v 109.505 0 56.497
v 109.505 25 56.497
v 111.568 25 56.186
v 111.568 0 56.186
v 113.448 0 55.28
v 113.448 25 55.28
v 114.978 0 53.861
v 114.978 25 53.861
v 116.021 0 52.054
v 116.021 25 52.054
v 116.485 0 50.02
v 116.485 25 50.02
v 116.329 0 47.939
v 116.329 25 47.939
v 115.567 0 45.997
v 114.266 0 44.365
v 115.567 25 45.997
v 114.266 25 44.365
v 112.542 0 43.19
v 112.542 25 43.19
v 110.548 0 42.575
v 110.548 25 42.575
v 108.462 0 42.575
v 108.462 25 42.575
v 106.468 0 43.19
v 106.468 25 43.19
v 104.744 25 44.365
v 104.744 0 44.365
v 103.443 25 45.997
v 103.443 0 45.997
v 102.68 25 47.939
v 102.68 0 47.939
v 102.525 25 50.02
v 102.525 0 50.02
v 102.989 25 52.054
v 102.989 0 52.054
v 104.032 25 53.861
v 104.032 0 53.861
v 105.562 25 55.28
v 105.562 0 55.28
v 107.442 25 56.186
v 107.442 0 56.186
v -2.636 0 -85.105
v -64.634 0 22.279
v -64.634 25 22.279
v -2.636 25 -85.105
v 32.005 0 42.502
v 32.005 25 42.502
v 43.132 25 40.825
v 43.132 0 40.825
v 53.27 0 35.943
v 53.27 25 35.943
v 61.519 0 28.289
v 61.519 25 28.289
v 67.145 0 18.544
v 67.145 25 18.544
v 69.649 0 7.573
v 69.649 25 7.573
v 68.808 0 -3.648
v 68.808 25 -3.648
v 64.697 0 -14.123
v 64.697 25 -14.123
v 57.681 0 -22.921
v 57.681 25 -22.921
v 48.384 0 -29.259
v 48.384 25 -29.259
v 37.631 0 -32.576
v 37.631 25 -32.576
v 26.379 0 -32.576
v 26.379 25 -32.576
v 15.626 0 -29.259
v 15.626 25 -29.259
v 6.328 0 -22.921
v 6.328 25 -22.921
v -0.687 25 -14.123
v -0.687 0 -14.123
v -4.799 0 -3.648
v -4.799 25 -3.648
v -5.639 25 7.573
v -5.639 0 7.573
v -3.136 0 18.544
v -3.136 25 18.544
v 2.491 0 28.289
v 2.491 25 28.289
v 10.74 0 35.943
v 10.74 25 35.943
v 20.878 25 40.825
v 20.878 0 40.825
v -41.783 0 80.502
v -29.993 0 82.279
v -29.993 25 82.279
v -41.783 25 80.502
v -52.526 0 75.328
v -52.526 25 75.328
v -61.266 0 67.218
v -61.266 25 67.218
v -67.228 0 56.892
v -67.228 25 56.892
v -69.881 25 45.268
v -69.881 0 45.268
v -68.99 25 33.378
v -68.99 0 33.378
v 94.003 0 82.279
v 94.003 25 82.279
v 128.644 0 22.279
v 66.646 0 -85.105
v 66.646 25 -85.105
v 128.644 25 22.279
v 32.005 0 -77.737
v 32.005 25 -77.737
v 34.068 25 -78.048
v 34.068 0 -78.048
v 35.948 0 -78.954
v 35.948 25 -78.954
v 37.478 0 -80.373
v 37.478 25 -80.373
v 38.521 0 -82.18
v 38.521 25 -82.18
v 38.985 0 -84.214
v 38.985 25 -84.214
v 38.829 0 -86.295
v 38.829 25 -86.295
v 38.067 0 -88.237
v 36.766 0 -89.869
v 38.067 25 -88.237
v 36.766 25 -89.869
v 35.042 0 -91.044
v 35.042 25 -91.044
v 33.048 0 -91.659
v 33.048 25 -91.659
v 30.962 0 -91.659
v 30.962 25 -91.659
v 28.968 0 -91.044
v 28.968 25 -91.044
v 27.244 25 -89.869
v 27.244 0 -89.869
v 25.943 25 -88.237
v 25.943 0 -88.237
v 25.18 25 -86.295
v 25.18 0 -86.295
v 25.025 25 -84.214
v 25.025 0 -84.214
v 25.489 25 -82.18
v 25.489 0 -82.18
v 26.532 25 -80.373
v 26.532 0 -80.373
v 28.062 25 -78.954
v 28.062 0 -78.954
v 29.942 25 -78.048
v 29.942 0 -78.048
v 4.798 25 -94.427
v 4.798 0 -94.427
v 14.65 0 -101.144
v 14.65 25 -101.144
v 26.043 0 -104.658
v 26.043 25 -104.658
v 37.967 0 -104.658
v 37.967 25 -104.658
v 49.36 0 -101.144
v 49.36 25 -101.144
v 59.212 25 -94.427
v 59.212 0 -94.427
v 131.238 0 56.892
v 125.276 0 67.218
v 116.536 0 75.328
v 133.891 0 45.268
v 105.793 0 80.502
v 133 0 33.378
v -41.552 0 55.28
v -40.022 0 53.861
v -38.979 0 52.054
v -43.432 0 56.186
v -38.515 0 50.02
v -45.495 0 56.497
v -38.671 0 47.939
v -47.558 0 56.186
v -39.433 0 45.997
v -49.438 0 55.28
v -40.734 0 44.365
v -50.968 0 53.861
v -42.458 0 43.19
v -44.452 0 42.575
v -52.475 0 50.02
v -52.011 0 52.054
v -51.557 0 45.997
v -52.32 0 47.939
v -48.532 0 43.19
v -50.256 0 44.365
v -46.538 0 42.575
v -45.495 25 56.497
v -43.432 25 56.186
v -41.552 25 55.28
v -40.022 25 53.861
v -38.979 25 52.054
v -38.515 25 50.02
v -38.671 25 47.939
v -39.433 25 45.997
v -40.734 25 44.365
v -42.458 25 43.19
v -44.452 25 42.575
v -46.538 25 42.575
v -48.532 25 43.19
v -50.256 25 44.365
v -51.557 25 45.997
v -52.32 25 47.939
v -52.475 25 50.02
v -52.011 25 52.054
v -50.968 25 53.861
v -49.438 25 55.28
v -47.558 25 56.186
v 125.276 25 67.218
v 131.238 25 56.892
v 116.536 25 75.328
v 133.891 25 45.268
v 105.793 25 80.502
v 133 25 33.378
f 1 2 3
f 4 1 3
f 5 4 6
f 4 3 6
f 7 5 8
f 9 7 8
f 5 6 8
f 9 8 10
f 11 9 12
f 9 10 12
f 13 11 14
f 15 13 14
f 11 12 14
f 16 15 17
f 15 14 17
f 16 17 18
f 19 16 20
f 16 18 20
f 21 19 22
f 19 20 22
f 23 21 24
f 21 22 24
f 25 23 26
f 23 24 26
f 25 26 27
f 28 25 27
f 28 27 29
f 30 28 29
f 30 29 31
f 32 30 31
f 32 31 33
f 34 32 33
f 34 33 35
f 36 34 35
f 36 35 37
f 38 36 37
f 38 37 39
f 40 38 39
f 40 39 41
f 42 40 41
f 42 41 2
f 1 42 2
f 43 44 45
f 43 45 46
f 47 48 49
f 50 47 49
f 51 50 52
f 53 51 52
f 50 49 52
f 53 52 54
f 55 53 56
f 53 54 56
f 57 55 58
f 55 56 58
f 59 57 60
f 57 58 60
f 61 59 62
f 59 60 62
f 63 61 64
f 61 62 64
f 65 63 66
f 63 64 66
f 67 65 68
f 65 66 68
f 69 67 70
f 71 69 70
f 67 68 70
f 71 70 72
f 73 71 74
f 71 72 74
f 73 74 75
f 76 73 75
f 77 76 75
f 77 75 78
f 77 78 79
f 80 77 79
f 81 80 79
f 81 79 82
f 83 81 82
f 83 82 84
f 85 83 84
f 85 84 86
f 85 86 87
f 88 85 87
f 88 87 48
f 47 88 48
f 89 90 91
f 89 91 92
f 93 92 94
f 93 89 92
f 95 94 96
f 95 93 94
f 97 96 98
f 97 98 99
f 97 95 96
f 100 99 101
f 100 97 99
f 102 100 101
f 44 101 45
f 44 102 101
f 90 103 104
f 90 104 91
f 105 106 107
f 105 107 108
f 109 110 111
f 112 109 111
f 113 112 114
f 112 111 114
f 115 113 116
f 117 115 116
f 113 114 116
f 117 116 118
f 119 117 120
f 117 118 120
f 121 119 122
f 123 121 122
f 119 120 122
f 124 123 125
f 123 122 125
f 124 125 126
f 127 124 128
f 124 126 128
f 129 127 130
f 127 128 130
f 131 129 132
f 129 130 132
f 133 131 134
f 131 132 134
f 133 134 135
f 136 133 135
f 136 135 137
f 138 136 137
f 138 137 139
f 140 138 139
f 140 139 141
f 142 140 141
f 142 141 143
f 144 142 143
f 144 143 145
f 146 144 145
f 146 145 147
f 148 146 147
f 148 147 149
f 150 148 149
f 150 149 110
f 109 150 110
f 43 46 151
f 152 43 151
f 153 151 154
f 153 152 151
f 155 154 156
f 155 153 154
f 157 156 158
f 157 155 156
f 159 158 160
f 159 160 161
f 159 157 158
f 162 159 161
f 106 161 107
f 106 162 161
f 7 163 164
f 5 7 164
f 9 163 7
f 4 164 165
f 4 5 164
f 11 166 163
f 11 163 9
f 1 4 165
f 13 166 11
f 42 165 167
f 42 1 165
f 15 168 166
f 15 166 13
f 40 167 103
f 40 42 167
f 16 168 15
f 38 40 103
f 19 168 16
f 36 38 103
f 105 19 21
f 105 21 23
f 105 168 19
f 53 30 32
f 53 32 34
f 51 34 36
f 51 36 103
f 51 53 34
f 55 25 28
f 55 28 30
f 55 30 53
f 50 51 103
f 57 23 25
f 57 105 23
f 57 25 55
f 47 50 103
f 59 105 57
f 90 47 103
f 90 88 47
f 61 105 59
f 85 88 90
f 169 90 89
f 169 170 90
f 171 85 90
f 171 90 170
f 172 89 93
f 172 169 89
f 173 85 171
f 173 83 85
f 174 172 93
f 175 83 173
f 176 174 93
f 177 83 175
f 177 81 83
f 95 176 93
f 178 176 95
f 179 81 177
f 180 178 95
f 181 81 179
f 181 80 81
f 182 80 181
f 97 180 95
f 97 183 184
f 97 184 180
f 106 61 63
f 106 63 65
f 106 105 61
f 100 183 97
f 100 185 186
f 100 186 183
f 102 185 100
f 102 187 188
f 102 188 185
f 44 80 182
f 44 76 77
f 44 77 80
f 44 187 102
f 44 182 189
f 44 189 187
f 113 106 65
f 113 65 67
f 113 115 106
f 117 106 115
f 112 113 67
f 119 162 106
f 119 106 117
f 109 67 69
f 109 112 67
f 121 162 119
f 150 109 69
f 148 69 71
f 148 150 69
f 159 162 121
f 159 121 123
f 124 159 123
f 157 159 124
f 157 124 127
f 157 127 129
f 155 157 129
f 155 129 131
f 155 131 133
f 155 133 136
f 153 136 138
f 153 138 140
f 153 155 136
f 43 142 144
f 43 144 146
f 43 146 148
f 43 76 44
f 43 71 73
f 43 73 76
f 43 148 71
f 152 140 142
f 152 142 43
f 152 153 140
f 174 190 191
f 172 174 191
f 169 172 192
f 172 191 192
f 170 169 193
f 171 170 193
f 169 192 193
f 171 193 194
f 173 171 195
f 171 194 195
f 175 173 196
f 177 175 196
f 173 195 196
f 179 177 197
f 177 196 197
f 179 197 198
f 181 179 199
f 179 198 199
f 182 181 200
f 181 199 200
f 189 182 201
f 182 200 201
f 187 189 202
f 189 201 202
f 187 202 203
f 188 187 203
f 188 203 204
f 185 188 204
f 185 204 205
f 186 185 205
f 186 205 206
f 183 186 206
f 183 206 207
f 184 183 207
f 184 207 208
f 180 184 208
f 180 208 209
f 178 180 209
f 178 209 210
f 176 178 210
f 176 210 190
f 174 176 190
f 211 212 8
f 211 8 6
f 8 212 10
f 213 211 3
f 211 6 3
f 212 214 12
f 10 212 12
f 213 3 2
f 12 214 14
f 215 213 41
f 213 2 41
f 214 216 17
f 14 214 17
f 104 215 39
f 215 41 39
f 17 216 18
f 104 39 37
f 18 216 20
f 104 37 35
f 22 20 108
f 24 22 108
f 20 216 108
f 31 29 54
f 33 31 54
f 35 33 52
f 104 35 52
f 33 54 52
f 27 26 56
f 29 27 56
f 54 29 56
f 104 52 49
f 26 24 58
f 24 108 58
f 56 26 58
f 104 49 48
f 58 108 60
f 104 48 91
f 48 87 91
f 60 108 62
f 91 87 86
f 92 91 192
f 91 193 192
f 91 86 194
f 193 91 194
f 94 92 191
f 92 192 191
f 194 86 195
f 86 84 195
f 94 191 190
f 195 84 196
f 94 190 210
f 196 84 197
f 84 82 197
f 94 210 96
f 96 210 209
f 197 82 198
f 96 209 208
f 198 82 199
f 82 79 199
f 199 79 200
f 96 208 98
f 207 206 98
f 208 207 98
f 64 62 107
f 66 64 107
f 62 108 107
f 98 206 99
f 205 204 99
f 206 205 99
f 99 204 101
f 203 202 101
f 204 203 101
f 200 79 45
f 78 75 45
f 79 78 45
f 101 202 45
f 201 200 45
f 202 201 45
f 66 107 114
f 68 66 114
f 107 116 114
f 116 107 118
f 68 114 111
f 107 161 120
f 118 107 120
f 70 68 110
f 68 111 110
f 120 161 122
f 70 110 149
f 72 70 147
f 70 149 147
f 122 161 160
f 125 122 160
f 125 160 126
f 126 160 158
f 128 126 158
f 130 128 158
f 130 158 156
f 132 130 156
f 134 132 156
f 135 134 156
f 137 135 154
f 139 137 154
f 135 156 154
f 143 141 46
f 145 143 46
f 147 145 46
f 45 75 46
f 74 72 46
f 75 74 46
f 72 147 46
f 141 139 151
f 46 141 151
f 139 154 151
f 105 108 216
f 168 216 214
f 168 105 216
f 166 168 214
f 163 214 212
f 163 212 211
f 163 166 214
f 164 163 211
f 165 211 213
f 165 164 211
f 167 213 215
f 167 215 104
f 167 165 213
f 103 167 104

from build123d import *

# Parameters (mm, degrees)
BOSS_EXTRUDE1_DEPTH = 25
SKETCH2_R           = 37.75
CUT_EXTRUDE1_DEPTH  = 28
SKETCH3_R           = 7
CUT_EXTRUDE2_DEPTH  = 173.13028653


with BuildPart() as part:
    # Sketch1 → Boss-Extrude1 (new body)
    with BuildSketch(Plane(origin=(0, 0, 0), x_dir=(1, 0, 0), z_dir=(0, 1, 0))):
        with BuildLine():
            Line((66.645984298, 85.104941493), (128.643951995, -22.278688525))
            ThreePointArc((128.643951995, -22.278688525), (128.643951995, -62.278688525), (94.002935844, -82.278688525))
            Line((94.002935844, -82.278688525), (-29.992999551, -82.278688525))
            ThreePointArc((-29.992999551, -82.278688525), (-64.634015702, -62.278688525), (-64.634015702, -22.278688525))
            Line((-64.634015702, -22.278688525), (-2.636048005, 85.104941493))
            ThreePointArc((-2.636048005, 85.104941493), (32.004968146, 105.104941493), (66.645984298, 85.104941493))
        make_face()
    extrude(amount=BOSS_EXTRUDE1_DEPTH)

    # Sketch2 → Cut-Extrude1 (cut)
    with BuildSketch(Plane(origin=(0, 25, 0), x_dir=(1, 0, 0), z_dir=(0, 1, 0))):
        with Locations(Location((32.004968146, -4.752094378, 0), (0, 0, 270))):
            Circle(SKETCH2_R)
    extrude(amount=-CUT_EXTRUDE1_DEPTH, mode=Mode.SUBTRACT)

    # Sketch3 → Cut-Extrude2 (cut, through all)
    with BuildSketch(Plane(origin=(0, 25, 0), x_dir=(1, 0, 0), z_dir=(0, 1, 0))):
        with Locations(Location((32.004968146, 84.737197347, 0), (0, 0, 270))):
            Circle(SKETCH3_R)
        with Locations(Location((109.504968146, -49.49674024, 0), (0, 0, 270))):
            Circle(SKETCH3_R)
        with Locations(Location((-45.495031854, -49.49674024, 0), (0, 0, 270))):
            Circle(SKETCH3_R)
    extrude(amount=-CUT_EXTRUDE2_DEPTH, mode=Mode.SUBTRACT)


solid = part.part
